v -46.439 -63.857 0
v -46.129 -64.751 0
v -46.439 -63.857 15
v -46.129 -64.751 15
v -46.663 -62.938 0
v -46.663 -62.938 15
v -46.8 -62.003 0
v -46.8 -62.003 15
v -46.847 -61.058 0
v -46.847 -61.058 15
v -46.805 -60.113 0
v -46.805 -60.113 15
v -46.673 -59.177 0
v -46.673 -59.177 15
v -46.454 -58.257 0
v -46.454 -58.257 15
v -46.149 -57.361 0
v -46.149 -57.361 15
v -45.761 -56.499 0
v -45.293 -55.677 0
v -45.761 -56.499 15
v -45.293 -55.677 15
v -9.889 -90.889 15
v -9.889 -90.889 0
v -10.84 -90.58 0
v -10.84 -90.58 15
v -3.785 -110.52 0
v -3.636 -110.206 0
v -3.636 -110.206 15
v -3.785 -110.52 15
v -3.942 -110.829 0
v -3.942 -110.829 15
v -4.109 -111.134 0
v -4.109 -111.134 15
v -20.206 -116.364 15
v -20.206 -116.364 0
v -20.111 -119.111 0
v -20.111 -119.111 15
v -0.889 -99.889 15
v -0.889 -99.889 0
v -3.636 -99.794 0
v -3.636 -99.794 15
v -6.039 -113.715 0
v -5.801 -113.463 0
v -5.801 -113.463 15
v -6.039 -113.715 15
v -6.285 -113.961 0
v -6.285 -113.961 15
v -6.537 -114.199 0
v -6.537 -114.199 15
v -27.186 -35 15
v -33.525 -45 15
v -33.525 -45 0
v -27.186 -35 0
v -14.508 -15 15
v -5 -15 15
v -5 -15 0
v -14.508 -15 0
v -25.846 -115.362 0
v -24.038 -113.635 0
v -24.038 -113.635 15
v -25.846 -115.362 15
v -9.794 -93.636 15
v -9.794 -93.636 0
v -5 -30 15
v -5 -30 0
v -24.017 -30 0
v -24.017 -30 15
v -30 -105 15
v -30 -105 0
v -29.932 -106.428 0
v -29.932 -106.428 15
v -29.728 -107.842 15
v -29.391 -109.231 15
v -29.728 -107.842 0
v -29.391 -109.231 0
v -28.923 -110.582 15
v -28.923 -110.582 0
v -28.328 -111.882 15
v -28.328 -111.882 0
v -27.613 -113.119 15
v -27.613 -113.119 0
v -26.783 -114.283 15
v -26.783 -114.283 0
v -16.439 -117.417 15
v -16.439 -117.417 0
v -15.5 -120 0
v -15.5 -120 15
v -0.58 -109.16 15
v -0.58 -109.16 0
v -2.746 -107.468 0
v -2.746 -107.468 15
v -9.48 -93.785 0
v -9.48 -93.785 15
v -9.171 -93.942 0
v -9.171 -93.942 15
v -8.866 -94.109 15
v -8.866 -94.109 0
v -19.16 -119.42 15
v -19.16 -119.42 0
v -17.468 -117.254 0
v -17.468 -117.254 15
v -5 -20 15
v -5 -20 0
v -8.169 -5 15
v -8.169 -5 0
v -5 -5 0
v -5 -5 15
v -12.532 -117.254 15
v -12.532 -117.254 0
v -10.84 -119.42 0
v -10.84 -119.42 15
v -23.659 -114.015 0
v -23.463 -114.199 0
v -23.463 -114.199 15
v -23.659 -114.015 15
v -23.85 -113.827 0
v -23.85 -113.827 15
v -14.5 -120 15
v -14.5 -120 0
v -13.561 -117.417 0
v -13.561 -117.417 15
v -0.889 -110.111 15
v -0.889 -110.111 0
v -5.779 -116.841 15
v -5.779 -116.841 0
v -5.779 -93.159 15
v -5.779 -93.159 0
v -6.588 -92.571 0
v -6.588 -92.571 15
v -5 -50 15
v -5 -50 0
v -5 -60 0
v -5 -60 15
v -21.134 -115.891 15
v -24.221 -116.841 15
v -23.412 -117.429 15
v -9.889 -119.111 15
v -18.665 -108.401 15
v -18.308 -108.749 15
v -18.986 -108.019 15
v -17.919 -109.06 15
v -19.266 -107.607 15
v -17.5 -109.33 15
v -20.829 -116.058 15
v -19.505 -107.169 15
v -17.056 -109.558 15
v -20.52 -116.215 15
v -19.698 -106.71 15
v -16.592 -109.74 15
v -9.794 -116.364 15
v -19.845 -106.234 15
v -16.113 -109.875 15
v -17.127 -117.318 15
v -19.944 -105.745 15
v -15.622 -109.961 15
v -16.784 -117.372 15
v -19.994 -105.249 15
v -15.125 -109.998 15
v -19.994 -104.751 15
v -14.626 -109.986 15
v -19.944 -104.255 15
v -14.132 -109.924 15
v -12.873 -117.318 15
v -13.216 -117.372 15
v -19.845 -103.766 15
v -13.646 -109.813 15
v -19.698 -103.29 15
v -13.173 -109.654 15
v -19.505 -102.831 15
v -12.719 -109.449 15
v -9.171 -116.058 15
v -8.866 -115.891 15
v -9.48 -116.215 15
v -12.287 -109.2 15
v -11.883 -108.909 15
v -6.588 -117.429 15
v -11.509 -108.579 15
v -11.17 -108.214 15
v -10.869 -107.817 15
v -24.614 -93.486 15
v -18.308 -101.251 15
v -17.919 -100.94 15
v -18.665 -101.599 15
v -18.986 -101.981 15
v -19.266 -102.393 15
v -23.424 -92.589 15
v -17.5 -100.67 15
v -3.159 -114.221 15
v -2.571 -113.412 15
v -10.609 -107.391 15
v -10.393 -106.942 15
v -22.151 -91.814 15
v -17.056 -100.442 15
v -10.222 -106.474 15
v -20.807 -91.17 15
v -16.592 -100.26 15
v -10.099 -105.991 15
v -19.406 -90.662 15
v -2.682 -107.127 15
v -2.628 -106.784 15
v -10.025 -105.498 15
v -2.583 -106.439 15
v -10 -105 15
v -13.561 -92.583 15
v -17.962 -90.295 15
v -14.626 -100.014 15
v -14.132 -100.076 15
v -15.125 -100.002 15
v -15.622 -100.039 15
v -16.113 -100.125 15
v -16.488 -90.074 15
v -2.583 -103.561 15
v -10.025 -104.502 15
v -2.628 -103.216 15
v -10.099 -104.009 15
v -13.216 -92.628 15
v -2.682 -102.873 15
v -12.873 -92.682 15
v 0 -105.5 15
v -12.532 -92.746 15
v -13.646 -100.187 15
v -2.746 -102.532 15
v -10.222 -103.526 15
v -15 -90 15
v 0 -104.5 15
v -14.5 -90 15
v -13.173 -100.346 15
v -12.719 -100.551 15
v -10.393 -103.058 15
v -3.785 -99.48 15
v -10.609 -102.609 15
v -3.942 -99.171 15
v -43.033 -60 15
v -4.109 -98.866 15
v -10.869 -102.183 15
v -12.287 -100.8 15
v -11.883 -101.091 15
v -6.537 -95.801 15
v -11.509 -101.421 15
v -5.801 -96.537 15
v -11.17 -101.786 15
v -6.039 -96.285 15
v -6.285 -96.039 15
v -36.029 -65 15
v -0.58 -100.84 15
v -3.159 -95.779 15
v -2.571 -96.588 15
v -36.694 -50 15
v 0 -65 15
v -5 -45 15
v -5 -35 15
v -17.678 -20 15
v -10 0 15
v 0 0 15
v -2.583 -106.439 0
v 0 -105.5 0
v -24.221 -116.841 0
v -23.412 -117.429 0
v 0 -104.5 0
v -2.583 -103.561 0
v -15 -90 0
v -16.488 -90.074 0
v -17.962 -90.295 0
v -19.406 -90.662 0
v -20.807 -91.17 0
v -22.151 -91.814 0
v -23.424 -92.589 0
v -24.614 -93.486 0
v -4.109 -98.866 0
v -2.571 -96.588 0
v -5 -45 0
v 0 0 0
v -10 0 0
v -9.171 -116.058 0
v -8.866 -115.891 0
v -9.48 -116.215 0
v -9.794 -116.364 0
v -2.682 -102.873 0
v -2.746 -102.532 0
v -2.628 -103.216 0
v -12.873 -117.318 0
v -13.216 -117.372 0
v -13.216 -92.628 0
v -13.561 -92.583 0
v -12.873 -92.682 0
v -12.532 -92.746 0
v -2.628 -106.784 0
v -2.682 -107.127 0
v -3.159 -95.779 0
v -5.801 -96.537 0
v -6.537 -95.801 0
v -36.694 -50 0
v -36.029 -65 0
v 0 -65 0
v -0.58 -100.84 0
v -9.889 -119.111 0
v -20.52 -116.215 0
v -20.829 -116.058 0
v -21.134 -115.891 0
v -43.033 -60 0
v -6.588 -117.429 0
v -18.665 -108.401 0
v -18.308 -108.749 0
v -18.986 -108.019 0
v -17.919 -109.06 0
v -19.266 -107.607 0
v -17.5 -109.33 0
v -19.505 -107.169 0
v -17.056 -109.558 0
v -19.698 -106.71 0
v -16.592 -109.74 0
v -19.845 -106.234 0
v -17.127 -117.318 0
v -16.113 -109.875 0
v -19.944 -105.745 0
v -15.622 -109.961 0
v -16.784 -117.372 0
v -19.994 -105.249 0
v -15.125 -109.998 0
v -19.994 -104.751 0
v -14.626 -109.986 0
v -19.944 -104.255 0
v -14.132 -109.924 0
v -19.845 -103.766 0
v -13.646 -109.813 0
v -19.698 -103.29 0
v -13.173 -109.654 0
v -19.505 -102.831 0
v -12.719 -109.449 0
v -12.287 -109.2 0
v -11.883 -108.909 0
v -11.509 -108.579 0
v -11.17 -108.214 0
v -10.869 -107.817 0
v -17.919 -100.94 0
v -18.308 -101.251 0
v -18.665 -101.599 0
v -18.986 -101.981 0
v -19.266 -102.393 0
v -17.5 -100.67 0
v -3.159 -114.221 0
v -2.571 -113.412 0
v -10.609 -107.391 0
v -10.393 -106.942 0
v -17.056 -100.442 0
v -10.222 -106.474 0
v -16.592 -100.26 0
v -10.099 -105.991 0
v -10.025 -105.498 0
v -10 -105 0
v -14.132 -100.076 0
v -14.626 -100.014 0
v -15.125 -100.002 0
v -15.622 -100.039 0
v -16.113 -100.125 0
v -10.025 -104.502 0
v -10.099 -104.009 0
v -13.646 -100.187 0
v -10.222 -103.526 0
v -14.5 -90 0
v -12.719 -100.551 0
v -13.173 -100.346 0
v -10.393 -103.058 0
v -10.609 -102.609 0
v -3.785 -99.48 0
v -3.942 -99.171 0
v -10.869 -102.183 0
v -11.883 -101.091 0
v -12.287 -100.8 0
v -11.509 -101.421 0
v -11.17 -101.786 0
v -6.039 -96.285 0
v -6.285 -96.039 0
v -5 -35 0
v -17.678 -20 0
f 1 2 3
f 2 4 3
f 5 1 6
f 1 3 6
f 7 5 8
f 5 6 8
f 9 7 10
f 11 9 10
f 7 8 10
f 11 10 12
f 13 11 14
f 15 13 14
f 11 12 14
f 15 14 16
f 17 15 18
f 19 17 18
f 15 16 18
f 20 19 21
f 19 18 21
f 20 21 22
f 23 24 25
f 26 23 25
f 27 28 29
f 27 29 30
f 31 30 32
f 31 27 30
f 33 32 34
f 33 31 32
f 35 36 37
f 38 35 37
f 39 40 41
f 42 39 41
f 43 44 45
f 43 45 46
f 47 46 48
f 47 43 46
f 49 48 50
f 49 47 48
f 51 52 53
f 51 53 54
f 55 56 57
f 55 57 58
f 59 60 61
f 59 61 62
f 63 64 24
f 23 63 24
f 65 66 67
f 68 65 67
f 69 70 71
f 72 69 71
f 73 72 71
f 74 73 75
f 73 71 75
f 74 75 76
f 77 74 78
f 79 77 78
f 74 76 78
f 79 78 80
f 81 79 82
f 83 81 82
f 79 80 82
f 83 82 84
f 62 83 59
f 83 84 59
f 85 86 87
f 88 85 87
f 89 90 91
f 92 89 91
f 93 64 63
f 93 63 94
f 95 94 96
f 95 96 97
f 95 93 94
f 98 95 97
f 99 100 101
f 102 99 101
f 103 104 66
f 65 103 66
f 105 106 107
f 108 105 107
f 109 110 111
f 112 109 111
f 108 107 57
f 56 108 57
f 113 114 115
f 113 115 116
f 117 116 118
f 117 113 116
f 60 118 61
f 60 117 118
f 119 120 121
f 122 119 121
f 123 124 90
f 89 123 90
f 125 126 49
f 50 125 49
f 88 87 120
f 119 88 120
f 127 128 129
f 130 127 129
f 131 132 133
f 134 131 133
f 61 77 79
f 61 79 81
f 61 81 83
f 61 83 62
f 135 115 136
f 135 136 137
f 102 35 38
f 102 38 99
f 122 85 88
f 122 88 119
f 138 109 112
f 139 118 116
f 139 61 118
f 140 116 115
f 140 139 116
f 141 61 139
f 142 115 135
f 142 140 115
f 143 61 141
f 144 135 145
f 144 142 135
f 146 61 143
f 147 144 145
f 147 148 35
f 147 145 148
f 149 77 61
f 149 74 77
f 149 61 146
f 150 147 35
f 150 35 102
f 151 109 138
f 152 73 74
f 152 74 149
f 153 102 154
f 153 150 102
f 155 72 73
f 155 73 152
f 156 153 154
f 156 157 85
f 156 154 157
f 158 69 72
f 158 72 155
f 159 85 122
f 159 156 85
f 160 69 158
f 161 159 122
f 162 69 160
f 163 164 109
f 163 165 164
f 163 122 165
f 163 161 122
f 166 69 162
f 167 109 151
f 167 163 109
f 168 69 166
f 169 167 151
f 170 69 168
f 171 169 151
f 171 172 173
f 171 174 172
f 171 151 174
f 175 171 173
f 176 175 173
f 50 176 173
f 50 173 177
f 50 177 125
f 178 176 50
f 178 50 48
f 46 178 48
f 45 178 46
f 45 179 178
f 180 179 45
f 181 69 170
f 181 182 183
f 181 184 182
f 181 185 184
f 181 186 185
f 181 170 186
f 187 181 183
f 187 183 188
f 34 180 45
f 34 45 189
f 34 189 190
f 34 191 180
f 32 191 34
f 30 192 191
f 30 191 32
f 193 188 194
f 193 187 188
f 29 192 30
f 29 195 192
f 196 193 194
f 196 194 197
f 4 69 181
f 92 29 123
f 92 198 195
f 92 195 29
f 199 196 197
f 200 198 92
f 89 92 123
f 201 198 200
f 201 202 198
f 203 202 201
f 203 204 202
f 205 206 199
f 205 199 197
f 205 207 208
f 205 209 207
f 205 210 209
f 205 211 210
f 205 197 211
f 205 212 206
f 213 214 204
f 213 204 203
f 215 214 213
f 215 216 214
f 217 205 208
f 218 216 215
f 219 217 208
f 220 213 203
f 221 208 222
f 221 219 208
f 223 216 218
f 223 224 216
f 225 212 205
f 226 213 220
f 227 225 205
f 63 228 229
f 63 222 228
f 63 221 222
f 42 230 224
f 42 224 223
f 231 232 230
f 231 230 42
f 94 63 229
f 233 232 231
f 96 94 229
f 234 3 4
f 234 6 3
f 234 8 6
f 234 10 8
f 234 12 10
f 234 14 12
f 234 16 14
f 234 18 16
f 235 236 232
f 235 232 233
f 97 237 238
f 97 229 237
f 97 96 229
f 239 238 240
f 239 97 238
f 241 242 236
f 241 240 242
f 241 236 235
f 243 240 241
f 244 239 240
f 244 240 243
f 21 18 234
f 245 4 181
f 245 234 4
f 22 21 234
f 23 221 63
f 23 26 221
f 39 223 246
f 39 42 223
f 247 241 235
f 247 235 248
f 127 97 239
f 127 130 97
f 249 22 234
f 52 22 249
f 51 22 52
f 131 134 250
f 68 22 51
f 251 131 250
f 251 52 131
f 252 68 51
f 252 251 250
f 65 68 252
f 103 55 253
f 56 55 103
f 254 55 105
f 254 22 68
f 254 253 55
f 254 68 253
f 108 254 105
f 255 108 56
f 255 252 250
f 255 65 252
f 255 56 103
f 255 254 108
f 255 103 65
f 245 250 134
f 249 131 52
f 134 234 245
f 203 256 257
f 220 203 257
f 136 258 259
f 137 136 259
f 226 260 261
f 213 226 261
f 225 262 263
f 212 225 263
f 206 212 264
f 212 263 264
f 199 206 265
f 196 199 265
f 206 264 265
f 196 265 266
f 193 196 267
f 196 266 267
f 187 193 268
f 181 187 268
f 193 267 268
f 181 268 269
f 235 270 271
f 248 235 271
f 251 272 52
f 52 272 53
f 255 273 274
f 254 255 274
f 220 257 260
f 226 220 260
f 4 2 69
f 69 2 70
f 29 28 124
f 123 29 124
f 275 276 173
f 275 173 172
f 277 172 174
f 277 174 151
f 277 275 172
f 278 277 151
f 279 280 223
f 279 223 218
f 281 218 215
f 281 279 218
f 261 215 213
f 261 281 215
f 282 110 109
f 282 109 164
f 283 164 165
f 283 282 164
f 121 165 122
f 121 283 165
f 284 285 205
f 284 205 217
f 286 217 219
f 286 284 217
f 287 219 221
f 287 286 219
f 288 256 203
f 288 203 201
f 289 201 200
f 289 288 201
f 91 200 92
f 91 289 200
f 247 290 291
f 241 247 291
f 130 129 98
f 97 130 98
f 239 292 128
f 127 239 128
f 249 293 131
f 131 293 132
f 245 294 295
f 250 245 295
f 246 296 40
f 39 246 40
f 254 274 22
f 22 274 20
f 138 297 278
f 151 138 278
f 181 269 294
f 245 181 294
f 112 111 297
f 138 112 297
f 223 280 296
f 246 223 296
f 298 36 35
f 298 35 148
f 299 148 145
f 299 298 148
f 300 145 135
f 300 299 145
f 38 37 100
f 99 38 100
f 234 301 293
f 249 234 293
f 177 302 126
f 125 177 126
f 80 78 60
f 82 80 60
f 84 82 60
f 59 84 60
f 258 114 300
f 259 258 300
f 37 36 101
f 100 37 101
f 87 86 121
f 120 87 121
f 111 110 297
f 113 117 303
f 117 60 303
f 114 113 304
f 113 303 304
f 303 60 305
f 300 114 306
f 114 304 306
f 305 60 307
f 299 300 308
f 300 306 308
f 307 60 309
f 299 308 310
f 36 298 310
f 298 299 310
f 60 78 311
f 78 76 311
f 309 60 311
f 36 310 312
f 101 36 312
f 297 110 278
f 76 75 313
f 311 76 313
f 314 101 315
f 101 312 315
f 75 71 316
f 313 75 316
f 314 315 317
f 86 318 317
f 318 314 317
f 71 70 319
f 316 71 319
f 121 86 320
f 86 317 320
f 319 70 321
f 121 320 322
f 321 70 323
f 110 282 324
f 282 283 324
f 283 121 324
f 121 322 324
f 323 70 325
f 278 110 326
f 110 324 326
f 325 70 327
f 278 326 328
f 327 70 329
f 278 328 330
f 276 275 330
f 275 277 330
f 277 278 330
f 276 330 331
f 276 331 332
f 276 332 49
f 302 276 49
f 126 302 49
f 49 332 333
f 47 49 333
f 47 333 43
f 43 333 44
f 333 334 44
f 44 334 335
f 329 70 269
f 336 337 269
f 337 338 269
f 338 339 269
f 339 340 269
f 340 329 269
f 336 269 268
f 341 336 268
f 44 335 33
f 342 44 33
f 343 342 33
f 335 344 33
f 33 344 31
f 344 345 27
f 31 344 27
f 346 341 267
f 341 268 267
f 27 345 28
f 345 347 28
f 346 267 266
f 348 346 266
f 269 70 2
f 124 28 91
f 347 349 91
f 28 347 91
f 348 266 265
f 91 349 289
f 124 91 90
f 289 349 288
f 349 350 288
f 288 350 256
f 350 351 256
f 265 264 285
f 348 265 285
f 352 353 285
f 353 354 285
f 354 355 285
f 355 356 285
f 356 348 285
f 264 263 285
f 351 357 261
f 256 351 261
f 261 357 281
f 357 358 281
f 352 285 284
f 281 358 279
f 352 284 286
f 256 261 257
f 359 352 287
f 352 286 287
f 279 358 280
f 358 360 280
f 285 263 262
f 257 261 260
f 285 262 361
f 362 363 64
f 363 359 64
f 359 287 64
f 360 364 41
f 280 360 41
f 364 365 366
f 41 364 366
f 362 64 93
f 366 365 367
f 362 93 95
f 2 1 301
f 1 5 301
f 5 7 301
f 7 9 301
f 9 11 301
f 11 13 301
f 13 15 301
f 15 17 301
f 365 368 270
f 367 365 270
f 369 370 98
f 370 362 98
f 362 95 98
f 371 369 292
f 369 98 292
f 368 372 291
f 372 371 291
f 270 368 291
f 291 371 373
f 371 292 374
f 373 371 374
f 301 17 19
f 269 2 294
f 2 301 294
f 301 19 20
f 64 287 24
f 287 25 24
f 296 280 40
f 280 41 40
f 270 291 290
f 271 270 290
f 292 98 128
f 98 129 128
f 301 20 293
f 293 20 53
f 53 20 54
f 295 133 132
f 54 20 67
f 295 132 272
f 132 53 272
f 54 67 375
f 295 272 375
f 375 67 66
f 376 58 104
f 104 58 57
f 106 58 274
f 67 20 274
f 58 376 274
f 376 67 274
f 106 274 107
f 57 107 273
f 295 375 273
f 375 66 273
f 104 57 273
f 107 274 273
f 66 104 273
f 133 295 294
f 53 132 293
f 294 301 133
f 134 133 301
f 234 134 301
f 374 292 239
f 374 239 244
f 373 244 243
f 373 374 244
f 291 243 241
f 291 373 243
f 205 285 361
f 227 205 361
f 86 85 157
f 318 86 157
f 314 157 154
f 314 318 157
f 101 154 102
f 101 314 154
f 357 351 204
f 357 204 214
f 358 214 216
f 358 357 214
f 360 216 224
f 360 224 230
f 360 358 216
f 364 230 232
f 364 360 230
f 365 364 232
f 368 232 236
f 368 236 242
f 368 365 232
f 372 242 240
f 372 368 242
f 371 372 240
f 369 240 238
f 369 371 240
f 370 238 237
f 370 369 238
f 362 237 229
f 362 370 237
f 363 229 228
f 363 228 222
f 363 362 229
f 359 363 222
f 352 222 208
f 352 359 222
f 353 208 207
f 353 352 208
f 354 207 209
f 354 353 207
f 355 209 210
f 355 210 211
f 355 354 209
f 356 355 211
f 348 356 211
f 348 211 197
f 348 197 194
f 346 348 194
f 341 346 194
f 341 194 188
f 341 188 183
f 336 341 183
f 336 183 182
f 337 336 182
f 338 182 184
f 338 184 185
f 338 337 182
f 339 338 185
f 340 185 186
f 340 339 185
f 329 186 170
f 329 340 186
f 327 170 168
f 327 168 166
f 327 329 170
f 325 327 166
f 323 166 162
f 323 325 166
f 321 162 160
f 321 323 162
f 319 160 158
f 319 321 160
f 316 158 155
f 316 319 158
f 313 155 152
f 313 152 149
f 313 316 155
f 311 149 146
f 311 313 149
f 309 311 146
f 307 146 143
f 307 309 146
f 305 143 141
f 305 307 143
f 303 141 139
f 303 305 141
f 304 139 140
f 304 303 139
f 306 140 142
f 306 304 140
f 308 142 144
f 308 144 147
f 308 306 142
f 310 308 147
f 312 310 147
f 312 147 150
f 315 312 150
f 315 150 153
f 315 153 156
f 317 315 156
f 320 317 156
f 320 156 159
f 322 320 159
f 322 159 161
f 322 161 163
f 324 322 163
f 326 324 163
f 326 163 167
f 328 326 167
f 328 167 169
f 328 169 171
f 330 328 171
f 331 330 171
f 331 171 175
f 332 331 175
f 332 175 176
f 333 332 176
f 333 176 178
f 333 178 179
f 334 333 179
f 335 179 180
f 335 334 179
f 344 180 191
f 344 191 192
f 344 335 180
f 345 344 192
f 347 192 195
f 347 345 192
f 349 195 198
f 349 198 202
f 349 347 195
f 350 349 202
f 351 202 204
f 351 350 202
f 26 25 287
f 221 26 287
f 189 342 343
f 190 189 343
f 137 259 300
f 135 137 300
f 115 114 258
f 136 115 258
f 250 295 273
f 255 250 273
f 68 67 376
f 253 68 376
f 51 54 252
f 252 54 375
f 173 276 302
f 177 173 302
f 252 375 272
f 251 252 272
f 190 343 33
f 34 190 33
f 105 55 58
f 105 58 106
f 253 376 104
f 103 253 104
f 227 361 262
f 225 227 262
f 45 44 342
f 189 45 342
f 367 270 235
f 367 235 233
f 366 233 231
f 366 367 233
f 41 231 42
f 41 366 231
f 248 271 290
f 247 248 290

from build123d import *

# Parameters (mm, degrees)
SKETCH1_R           = 5
BOSS_EXTRUDE1_DEPTH = 15
CUT_EXTRUDE1_START  = -15
CUT_EXTRUDE1_DEPTH  = 15
BOSS_EXTRUDE2_START = -15
BOSS_EXTRUDE2_DEPTH = 15
FILLET1_R           = 10


with BuildPart() as part:
    # Sketch1 → Boss-Extrude1 (new body)
    with BuildSketch(Plane.XY):
        with BuildLine():
            Line((0, 0), (-10, 0))
            Line((-10, 0), (-48.033043506, -60))
            Line((-48.033043506, -60), (-30, -105))
            ThreePointArc((-30, -105), (-1.41305071, -111.355691072), (-24.614025467, -93.486073028))
            Line((-24.614025467, -93.486073028), (-36.029372005, -65))
            Line((-36.029372005, -65), (0, -65))
            Line((0, -65), (0, 0))
        make_face()
        Polygon((-5, -50), (-5, -60), (-43.033043506, -60), (-36.694202922, -50), align=None, mode=Mode.SUBTRACT)
        Polygon((-27.185942045, -35), (-5, -35), (-5, -45), (-33.52478263, -45), align=None, mode=Mode.SUBTRACT)
        Polygon((-17.677681169, -20), (-5, -20), (-5, -30), (-24.016521753, -30), align=None, mode=Mode.SUBTRACT)
        Polygon((-14.508260877, -15), (-8.169420292, -5), (-5, -5), (-5, -15), align=None, mode=Mode.SUBTRACT)
        with Locations((-15, -105)):
            Circle(SKETCH1_R, mode=Mode.SUBTRACT)
    extrude(amount=BOSS_EXTRUDE1_DEPTH)

    # Sketch2 → Cut-Extrude1 (cut)
    with BuildSketch(Plane.XY.offset(15).offset(CUT_EXTRUDE1_START)):
        with BuildLine():
            Line((-15, -90), (-15, -92.5))
            ThreePointArc((-15, -92.5), (-3.506810704, -109.914936399), (-24.038127106, -113.634944031))
            Line((-24.038127106, -113.634944031), (-25.845752528, -115.361932837))
            ThreePointArc((-25.845752528, -115.361932837), (-1.208172845, -110.897923679), (-15, -90))
        make_face()
    extrude(amount=CUT_EXTRUDE1_DEPTH, mode=Mode.SUBTRACT)

    # Sketch3 → Boss-Extrude2 (add)
    with BuildSketch(Plane.XY.offset(15).offset(BOSS_EXTRUDE2_START)):
        with BuildLine():
            Line((-14.5, -90), (-15, -90))
            Line((-15, -90), (-15, -92.5))
            ThreePointArc((-15, -92.5), (-14.279138, -92.520802992), (-13.560675373, -92.583142724))
            Line((-13.560675373, -92.583142724), (-14.5, -90))
        make_face()
        with BuildLine():
            Line((-10.840273343, -90.579643758), (-12.53185915, -92.746091205))
            ThreePointArc((-12.53185915, -92.746091205), (-11.13728757, -93.111793546), (-9.79410102, -93.635642746))
            Line((-9.79410102, -93.635642746), (-9.889216826, -90.888660753))
            Line((-9.889216826, -90.888660753), (-10.840273343, -90.579643758))
        make_face()
        with BuildLine():
            Line((-6.587729713, -92.570852458), (-8.865992497, -94.108537658))
            ThreePointArc((-8.865992497, -94.108537658), (-7.652684346, -94.88728757), (-6.53711633, -95.800565236))
            Line((-6.53711633, -95.800565236), (-5.778712718, -93.158637711))
            Line((-5.778712718, -93.158637711), (-6.587729713, -92.570852458))
        make_face()
        with BuildLine():
            Line((-3.158637711, -95.778712718), (-5.800565236, -96.53711633))
            ThreePointArc((-5.800565236, -96.53711633), (-4.88728757, -97.652684346), (-4.108537658, -98.865992497))
            Line((-4.108537658, -98.865992497), (-2.570852458, -96.587729713))
            Line((-2.570852458, -96.587729713), (-3.158637711, -95.778712718))
        make_face()
        with BuildLine():
            Line((-0.888660753, -99.889216826), (-3.635642746, -99.79410102))
            ThreePointArc((-3.635642746, -99.79410102), (-3.111793546, -101.13728757), (-2.746091205, -102.53185915))
            Line((-2.746091205, -102.53185915), (-0.579643758, -100.840273343))
            Line((-0.579643758, -100.840273343), (-0.888660753, -99.889216826))
        make_face()
        with BuildLine():
            Line((0, -104.5), (-2.583142724, -103.560675373))
            ThreePointArc((-2.583142724, -103.560675373), (-2.5, -105), (-2.583142724, -106.439324627))
            Line((-2.583142724, -106.439324627), (0, -105.5))
            Line((0, -105.5), (0, -104.5))
        make_face()
        with BuildLine():
            Line((-0.579643758, -109.159726657), (-2.746091205, -107.46814085))
            ThreePointArc((-2.746091205, -107.46814085), (-3.111793546, -108.86271243), (-3.635642746, -110.20589898))
            Line((-3.635642746, -110.20589898), (-0.888660753, -110.110783174))
            Line((-0.888660753, -110.110783174), (-0.579643758, -109.159726657))
        make_face()
        with BuildLine():
            ThreePointArc((-21.134007503, -115.891462342), (-22.347315654, -115.11271243), (-23.46288367, -114.199434764))
            Line((-23.46288367, -114.199434764), (-24.221287282, -116.841362289))
            Line((-24.221287282, -116.841362289), (-23.412270287, -117.429147542))
            Line((-23.412270287, -117.429147542), (-21.134007503, -115.891462342))
        make_face()
        with BuildLine():
            Line((-2.570852458, -113.412270287), (-4.108537658, -111.134007503))
            ThreePointArc((-4.108537658, -111.134007503), (-4.88728757, -112.347315654), (-5.800565236, -113.46288367))
            Line((-5.800565236, -113.46288367), (-3.158637711, -114.221287282))
            Line((-3.158637711, -114.221287282), (-2.570852458, -113.412270287))
        make_face()
        with BuildLine():
            ThreePointArc((-17.46814085, -117.253908795), (-18.86271243, -116.888206454), (-20.20589898, -116.364357254))
            Line((-20.20589898, -116.364357254), (-20.110783174, -119.111339247))
            Line((-20.110783174, -119.111339247), (-19.159726657, -119.420356242))
            Line((-19.159726657, -119.420356242), (-17.46814085, -117.253908795))
        make_face()
        with BuildLine():
            Line((-5.778712718, -116.841362289), (-6.53711633, -114.199434764))
            ThreePointArc((-6.53711633, -114.199434764), (-7.652684346, -115.11271243), (-8.865992497, -115.891462342))
            Line((-8.865992497, -115.891462342), (-6.587729713, -117.429147542))
            Line((-6.587729713, -117.429147542), (-5.778712718, -116.841362289))
        make_face()
        with BuildLine():
            ThreePointArc((-13.560675373, -117.416857276), (-15, -117.5), (-16.439324627, -117.416857276))
            Line((-16.439324627, -117.416857276), (-15.5, -120))
            Line((-15.5, -120), (-14.5, -120))
            Line((-14.5, -120), (-13.560675373, -117.416857276))
        make_face()
        with BuildLine():
            Line((-9.889216826, -119.111339247), (-9.79410102, -116.364357254))
            ThreePointArc((-9.79410102, -116.364357254), (-11.13728757, -116.888206454), (-12.53185915, -117.253908795))
            Line((-12.53185915, -117.253908795), (-10.840273343, -119.420356242))
            Line((-10.840273343, -119.420356242), (-9.889216826, -119.111339247))
        make_face()
    extrude(amount=BOSS_EXTRUDE2_DEPTH)

    # Fillet1
    fillet1_edges = [part.edges().sort_by_distance(p)[0] for p in [
        (-48.033043506, -60, 7.5),
    ]]
    fillet(fillet1_edges, radius=FILLET1_R)


solid = part.part
